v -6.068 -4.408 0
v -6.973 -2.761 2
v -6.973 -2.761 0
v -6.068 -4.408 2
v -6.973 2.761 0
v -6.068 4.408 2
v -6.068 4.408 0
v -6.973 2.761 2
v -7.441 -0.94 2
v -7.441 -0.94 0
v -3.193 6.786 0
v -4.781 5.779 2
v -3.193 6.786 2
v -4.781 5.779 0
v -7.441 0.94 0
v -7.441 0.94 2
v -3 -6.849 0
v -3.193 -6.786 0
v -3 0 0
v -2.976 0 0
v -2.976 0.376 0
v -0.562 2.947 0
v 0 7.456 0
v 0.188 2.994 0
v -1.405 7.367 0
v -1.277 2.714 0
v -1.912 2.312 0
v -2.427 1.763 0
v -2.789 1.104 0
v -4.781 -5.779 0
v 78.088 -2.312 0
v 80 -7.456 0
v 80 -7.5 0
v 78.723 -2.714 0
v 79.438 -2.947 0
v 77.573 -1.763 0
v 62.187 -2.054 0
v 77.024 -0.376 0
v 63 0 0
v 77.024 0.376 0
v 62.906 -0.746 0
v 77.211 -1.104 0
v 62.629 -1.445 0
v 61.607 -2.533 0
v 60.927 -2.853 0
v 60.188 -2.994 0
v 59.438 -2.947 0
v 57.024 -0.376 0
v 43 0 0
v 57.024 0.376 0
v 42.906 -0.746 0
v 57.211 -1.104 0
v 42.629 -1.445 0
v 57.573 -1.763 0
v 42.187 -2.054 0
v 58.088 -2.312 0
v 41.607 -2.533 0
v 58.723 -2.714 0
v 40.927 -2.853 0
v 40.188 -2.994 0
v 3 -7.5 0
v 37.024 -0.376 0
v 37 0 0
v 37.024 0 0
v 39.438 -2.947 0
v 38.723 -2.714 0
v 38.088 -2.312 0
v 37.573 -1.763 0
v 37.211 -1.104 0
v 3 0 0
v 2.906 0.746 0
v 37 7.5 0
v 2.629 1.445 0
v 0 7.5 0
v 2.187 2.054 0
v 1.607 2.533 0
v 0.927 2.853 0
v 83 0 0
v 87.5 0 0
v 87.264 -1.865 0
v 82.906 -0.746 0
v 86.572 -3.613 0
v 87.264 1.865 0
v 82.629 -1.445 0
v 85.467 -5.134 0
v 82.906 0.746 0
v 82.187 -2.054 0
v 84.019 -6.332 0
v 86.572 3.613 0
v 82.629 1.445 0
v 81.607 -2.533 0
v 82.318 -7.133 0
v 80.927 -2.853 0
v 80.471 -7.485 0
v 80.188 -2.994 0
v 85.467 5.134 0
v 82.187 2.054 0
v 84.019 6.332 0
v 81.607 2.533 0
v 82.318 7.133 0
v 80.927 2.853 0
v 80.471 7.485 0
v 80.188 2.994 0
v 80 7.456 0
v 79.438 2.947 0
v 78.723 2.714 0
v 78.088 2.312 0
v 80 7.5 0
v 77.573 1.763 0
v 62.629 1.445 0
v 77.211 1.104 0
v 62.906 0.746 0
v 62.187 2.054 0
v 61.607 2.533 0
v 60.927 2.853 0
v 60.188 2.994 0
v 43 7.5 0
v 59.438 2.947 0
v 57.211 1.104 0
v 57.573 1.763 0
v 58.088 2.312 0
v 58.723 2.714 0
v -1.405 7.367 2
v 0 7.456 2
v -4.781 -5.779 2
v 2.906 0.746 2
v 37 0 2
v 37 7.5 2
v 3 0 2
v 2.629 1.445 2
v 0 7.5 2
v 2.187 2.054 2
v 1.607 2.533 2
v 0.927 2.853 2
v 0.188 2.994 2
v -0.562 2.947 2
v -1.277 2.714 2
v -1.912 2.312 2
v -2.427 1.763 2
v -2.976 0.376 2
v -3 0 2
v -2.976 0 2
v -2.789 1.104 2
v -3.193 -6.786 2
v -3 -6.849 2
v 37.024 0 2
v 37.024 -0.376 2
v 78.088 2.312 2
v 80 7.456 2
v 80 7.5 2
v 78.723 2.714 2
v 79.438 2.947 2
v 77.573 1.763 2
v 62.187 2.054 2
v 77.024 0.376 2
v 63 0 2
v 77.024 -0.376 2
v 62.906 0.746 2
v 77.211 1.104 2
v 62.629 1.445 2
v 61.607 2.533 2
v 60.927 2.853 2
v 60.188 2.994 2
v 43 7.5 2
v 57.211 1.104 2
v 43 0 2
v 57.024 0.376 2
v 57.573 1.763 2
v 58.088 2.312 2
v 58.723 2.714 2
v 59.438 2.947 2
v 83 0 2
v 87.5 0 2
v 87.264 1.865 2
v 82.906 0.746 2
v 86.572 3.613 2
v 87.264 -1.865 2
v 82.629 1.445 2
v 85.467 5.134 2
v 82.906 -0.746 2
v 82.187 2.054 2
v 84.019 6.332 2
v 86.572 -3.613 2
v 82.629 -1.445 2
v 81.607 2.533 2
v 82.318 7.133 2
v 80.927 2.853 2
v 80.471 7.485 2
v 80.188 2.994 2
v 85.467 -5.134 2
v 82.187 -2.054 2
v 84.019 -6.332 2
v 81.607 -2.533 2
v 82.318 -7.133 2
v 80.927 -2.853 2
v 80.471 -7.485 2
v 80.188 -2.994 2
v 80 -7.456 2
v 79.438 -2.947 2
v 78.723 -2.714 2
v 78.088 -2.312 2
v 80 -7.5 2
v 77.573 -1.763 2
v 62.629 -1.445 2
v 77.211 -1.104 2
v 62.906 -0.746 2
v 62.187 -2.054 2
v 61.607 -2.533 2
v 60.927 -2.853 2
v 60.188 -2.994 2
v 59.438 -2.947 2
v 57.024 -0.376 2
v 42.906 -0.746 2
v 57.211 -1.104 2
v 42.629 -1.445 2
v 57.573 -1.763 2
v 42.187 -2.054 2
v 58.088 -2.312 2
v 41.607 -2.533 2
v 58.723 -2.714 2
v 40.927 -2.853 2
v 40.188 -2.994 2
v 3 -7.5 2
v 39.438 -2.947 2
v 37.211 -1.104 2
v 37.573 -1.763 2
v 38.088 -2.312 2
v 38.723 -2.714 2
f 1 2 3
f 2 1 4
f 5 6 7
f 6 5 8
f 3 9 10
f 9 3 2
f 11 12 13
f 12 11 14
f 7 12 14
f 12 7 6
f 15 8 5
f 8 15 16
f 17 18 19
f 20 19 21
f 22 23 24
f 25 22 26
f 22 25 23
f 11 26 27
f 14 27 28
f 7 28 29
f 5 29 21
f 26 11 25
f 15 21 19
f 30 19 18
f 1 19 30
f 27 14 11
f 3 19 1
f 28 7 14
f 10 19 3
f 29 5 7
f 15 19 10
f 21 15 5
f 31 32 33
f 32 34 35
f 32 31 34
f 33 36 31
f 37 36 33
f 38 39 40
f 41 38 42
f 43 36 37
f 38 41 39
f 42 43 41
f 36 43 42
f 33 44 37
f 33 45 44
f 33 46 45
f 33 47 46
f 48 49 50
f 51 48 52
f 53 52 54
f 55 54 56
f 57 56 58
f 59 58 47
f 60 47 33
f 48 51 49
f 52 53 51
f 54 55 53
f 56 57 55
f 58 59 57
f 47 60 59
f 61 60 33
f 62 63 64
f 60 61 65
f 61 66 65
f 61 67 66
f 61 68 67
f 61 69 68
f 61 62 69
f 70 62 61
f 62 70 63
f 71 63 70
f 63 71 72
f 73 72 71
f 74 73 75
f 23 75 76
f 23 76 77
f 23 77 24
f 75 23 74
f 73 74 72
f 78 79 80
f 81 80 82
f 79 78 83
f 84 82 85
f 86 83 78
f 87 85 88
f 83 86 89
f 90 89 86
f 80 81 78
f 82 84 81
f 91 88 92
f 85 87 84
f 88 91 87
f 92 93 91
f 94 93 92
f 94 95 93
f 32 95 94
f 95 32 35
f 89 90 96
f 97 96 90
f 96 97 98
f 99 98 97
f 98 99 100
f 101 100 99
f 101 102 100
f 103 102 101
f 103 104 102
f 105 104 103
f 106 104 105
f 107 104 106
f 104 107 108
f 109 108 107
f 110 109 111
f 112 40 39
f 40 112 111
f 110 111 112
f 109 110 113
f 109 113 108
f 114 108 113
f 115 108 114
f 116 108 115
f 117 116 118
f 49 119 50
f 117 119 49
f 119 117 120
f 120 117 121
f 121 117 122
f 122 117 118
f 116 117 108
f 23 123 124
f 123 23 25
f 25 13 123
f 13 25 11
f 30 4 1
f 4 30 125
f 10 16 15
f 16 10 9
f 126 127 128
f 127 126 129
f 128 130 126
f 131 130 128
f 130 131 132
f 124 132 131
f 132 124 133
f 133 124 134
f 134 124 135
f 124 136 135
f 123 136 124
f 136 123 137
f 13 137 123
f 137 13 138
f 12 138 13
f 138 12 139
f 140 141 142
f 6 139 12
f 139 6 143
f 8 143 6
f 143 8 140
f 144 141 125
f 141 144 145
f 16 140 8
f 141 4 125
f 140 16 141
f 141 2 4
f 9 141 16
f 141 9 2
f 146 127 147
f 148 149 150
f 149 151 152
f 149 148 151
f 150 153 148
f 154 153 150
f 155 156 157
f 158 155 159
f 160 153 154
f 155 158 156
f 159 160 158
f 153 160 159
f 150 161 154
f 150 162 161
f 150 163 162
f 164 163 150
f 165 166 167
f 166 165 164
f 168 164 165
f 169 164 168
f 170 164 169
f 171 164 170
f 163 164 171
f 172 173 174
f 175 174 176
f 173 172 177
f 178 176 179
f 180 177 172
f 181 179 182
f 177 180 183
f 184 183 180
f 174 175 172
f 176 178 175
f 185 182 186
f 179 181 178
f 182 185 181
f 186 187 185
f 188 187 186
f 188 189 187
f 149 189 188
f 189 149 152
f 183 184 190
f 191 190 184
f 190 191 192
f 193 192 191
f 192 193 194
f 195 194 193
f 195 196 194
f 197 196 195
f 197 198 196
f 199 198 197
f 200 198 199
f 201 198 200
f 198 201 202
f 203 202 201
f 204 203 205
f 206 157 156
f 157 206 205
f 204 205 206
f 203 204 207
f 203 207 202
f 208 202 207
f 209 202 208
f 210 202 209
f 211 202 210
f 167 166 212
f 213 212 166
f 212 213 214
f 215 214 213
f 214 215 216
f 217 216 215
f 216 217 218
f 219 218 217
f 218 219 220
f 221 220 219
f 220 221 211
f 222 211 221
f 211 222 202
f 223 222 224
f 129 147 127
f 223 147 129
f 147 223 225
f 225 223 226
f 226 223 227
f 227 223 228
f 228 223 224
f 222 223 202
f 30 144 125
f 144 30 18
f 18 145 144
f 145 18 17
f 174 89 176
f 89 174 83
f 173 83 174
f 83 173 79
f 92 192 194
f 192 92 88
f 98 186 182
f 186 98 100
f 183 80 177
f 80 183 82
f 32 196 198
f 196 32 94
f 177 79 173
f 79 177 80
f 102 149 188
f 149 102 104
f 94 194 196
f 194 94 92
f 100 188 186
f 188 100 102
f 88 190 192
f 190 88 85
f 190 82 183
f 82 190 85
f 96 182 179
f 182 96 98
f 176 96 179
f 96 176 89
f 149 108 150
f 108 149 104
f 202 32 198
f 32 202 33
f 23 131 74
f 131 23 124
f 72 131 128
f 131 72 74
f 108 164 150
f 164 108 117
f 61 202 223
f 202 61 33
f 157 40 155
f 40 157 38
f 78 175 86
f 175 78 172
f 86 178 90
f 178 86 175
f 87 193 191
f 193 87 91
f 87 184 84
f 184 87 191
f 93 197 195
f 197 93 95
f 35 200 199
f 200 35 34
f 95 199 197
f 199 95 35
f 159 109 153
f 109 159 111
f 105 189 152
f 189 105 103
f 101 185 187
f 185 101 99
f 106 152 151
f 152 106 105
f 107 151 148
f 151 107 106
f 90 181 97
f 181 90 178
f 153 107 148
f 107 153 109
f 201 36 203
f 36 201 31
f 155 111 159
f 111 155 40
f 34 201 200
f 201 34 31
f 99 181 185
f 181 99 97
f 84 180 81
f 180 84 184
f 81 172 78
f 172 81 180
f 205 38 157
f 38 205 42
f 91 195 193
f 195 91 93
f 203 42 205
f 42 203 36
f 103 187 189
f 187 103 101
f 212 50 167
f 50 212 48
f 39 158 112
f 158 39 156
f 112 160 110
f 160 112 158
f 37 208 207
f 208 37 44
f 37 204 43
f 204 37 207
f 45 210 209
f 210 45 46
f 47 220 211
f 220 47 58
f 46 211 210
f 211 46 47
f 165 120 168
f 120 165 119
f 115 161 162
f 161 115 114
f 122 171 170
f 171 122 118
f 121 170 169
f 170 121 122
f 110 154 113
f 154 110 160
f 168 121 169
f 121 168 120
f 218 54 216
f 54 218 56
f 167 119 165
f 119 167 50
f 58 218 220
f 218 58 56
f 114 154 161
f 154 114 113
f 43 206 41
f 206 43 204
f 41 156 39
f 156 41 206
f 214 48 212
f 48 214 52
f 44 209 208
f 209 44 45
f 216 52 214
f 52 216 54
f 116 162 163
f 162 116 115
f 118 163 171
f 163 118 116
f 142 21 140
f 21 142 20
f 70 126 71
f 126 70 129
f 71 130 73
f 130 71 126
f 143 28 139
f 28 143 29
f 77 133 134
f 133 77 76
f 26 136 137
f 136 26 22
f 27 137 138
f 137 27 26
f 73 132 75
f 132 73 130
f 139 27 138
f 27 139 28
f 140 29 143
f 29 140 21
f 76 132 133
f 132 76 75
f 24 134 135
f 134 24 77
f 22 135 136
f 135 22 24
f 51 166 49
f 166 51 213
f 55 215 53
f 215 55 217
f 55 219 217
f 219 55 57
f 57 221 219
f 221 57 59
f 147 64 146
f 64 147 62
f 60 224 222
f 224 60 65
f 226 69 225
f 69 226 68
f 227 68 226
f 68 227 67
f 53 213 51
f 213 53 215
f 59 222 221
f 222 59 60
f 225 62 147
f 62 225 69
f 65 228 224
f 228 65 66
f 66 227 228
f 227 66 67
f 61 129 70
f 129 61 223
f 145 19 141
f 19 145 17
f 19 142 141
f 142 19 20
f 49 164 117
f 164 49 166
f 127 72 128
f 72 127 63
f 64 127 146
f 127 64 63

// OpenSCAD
ismale=false;

quality=25;


bar_length=80;
bar_thickness=2;

pin_radius=2.5;
gap_radius=3;
pin_length=12;

//bar backing

difference() 
{
union()
{
    //backing
    cylinder(r=pin_radius*3,h=bar_thickness,$fn=quality);
    translate([bar_length,0,0]) cylinder(r=pin_radius*3,h=bar_thickness,$fn=quality);
    translate([0,-pin_radius*3,0]) cube([bar_length,pin_radius*6,bar_thickness]);
    
    
    //male pins
    if (ismale)
    {
        translate([bar_length,0,0]) cylinder(r=pin_radius,h=pin_length,$fn=quality);
        //translate([(bar_length/4),0,0]) cylinder(r=pin_radius,h=pin_length,$fn=quality);
        translate([(bar_length/4)*3,0,0]) cylinder(r=pin_radius,h=pin_length,$fn=quality);
    }
}


//socket generation
union()
{
    cylinder(r=gap_radius,h=bar_thickness,$fn=quality);
    translate([bar_length/2,0,0]) cylinder(r=gap_radius,h=bar_thickness,$fn=quality);
    translate([-gap_radius,-pin_radius*3,0]) cube([gap_radius*2,pin_radius*3,bar_thickness]);
    translate([-gap_radius + bar_length/2,0,0]) cube([gap_radius*2,pin_radius*3,bar_thickness]);
    
    //female specific sockets
    if (ismale != true)
    {
        translate([bar_length,0,0]) cylinder(r=gap_radius,h=pin_length,$fn=quality);
        //translate([(bar_length/4),0,0]) cylinder(r=gap_radius,h=pin_length,$fn=quality);
        translate([(bar_length/4)*3,0,0]) cylinder(r=gap_radius,h=pin_length,$fn=quality);
    }
}

}
